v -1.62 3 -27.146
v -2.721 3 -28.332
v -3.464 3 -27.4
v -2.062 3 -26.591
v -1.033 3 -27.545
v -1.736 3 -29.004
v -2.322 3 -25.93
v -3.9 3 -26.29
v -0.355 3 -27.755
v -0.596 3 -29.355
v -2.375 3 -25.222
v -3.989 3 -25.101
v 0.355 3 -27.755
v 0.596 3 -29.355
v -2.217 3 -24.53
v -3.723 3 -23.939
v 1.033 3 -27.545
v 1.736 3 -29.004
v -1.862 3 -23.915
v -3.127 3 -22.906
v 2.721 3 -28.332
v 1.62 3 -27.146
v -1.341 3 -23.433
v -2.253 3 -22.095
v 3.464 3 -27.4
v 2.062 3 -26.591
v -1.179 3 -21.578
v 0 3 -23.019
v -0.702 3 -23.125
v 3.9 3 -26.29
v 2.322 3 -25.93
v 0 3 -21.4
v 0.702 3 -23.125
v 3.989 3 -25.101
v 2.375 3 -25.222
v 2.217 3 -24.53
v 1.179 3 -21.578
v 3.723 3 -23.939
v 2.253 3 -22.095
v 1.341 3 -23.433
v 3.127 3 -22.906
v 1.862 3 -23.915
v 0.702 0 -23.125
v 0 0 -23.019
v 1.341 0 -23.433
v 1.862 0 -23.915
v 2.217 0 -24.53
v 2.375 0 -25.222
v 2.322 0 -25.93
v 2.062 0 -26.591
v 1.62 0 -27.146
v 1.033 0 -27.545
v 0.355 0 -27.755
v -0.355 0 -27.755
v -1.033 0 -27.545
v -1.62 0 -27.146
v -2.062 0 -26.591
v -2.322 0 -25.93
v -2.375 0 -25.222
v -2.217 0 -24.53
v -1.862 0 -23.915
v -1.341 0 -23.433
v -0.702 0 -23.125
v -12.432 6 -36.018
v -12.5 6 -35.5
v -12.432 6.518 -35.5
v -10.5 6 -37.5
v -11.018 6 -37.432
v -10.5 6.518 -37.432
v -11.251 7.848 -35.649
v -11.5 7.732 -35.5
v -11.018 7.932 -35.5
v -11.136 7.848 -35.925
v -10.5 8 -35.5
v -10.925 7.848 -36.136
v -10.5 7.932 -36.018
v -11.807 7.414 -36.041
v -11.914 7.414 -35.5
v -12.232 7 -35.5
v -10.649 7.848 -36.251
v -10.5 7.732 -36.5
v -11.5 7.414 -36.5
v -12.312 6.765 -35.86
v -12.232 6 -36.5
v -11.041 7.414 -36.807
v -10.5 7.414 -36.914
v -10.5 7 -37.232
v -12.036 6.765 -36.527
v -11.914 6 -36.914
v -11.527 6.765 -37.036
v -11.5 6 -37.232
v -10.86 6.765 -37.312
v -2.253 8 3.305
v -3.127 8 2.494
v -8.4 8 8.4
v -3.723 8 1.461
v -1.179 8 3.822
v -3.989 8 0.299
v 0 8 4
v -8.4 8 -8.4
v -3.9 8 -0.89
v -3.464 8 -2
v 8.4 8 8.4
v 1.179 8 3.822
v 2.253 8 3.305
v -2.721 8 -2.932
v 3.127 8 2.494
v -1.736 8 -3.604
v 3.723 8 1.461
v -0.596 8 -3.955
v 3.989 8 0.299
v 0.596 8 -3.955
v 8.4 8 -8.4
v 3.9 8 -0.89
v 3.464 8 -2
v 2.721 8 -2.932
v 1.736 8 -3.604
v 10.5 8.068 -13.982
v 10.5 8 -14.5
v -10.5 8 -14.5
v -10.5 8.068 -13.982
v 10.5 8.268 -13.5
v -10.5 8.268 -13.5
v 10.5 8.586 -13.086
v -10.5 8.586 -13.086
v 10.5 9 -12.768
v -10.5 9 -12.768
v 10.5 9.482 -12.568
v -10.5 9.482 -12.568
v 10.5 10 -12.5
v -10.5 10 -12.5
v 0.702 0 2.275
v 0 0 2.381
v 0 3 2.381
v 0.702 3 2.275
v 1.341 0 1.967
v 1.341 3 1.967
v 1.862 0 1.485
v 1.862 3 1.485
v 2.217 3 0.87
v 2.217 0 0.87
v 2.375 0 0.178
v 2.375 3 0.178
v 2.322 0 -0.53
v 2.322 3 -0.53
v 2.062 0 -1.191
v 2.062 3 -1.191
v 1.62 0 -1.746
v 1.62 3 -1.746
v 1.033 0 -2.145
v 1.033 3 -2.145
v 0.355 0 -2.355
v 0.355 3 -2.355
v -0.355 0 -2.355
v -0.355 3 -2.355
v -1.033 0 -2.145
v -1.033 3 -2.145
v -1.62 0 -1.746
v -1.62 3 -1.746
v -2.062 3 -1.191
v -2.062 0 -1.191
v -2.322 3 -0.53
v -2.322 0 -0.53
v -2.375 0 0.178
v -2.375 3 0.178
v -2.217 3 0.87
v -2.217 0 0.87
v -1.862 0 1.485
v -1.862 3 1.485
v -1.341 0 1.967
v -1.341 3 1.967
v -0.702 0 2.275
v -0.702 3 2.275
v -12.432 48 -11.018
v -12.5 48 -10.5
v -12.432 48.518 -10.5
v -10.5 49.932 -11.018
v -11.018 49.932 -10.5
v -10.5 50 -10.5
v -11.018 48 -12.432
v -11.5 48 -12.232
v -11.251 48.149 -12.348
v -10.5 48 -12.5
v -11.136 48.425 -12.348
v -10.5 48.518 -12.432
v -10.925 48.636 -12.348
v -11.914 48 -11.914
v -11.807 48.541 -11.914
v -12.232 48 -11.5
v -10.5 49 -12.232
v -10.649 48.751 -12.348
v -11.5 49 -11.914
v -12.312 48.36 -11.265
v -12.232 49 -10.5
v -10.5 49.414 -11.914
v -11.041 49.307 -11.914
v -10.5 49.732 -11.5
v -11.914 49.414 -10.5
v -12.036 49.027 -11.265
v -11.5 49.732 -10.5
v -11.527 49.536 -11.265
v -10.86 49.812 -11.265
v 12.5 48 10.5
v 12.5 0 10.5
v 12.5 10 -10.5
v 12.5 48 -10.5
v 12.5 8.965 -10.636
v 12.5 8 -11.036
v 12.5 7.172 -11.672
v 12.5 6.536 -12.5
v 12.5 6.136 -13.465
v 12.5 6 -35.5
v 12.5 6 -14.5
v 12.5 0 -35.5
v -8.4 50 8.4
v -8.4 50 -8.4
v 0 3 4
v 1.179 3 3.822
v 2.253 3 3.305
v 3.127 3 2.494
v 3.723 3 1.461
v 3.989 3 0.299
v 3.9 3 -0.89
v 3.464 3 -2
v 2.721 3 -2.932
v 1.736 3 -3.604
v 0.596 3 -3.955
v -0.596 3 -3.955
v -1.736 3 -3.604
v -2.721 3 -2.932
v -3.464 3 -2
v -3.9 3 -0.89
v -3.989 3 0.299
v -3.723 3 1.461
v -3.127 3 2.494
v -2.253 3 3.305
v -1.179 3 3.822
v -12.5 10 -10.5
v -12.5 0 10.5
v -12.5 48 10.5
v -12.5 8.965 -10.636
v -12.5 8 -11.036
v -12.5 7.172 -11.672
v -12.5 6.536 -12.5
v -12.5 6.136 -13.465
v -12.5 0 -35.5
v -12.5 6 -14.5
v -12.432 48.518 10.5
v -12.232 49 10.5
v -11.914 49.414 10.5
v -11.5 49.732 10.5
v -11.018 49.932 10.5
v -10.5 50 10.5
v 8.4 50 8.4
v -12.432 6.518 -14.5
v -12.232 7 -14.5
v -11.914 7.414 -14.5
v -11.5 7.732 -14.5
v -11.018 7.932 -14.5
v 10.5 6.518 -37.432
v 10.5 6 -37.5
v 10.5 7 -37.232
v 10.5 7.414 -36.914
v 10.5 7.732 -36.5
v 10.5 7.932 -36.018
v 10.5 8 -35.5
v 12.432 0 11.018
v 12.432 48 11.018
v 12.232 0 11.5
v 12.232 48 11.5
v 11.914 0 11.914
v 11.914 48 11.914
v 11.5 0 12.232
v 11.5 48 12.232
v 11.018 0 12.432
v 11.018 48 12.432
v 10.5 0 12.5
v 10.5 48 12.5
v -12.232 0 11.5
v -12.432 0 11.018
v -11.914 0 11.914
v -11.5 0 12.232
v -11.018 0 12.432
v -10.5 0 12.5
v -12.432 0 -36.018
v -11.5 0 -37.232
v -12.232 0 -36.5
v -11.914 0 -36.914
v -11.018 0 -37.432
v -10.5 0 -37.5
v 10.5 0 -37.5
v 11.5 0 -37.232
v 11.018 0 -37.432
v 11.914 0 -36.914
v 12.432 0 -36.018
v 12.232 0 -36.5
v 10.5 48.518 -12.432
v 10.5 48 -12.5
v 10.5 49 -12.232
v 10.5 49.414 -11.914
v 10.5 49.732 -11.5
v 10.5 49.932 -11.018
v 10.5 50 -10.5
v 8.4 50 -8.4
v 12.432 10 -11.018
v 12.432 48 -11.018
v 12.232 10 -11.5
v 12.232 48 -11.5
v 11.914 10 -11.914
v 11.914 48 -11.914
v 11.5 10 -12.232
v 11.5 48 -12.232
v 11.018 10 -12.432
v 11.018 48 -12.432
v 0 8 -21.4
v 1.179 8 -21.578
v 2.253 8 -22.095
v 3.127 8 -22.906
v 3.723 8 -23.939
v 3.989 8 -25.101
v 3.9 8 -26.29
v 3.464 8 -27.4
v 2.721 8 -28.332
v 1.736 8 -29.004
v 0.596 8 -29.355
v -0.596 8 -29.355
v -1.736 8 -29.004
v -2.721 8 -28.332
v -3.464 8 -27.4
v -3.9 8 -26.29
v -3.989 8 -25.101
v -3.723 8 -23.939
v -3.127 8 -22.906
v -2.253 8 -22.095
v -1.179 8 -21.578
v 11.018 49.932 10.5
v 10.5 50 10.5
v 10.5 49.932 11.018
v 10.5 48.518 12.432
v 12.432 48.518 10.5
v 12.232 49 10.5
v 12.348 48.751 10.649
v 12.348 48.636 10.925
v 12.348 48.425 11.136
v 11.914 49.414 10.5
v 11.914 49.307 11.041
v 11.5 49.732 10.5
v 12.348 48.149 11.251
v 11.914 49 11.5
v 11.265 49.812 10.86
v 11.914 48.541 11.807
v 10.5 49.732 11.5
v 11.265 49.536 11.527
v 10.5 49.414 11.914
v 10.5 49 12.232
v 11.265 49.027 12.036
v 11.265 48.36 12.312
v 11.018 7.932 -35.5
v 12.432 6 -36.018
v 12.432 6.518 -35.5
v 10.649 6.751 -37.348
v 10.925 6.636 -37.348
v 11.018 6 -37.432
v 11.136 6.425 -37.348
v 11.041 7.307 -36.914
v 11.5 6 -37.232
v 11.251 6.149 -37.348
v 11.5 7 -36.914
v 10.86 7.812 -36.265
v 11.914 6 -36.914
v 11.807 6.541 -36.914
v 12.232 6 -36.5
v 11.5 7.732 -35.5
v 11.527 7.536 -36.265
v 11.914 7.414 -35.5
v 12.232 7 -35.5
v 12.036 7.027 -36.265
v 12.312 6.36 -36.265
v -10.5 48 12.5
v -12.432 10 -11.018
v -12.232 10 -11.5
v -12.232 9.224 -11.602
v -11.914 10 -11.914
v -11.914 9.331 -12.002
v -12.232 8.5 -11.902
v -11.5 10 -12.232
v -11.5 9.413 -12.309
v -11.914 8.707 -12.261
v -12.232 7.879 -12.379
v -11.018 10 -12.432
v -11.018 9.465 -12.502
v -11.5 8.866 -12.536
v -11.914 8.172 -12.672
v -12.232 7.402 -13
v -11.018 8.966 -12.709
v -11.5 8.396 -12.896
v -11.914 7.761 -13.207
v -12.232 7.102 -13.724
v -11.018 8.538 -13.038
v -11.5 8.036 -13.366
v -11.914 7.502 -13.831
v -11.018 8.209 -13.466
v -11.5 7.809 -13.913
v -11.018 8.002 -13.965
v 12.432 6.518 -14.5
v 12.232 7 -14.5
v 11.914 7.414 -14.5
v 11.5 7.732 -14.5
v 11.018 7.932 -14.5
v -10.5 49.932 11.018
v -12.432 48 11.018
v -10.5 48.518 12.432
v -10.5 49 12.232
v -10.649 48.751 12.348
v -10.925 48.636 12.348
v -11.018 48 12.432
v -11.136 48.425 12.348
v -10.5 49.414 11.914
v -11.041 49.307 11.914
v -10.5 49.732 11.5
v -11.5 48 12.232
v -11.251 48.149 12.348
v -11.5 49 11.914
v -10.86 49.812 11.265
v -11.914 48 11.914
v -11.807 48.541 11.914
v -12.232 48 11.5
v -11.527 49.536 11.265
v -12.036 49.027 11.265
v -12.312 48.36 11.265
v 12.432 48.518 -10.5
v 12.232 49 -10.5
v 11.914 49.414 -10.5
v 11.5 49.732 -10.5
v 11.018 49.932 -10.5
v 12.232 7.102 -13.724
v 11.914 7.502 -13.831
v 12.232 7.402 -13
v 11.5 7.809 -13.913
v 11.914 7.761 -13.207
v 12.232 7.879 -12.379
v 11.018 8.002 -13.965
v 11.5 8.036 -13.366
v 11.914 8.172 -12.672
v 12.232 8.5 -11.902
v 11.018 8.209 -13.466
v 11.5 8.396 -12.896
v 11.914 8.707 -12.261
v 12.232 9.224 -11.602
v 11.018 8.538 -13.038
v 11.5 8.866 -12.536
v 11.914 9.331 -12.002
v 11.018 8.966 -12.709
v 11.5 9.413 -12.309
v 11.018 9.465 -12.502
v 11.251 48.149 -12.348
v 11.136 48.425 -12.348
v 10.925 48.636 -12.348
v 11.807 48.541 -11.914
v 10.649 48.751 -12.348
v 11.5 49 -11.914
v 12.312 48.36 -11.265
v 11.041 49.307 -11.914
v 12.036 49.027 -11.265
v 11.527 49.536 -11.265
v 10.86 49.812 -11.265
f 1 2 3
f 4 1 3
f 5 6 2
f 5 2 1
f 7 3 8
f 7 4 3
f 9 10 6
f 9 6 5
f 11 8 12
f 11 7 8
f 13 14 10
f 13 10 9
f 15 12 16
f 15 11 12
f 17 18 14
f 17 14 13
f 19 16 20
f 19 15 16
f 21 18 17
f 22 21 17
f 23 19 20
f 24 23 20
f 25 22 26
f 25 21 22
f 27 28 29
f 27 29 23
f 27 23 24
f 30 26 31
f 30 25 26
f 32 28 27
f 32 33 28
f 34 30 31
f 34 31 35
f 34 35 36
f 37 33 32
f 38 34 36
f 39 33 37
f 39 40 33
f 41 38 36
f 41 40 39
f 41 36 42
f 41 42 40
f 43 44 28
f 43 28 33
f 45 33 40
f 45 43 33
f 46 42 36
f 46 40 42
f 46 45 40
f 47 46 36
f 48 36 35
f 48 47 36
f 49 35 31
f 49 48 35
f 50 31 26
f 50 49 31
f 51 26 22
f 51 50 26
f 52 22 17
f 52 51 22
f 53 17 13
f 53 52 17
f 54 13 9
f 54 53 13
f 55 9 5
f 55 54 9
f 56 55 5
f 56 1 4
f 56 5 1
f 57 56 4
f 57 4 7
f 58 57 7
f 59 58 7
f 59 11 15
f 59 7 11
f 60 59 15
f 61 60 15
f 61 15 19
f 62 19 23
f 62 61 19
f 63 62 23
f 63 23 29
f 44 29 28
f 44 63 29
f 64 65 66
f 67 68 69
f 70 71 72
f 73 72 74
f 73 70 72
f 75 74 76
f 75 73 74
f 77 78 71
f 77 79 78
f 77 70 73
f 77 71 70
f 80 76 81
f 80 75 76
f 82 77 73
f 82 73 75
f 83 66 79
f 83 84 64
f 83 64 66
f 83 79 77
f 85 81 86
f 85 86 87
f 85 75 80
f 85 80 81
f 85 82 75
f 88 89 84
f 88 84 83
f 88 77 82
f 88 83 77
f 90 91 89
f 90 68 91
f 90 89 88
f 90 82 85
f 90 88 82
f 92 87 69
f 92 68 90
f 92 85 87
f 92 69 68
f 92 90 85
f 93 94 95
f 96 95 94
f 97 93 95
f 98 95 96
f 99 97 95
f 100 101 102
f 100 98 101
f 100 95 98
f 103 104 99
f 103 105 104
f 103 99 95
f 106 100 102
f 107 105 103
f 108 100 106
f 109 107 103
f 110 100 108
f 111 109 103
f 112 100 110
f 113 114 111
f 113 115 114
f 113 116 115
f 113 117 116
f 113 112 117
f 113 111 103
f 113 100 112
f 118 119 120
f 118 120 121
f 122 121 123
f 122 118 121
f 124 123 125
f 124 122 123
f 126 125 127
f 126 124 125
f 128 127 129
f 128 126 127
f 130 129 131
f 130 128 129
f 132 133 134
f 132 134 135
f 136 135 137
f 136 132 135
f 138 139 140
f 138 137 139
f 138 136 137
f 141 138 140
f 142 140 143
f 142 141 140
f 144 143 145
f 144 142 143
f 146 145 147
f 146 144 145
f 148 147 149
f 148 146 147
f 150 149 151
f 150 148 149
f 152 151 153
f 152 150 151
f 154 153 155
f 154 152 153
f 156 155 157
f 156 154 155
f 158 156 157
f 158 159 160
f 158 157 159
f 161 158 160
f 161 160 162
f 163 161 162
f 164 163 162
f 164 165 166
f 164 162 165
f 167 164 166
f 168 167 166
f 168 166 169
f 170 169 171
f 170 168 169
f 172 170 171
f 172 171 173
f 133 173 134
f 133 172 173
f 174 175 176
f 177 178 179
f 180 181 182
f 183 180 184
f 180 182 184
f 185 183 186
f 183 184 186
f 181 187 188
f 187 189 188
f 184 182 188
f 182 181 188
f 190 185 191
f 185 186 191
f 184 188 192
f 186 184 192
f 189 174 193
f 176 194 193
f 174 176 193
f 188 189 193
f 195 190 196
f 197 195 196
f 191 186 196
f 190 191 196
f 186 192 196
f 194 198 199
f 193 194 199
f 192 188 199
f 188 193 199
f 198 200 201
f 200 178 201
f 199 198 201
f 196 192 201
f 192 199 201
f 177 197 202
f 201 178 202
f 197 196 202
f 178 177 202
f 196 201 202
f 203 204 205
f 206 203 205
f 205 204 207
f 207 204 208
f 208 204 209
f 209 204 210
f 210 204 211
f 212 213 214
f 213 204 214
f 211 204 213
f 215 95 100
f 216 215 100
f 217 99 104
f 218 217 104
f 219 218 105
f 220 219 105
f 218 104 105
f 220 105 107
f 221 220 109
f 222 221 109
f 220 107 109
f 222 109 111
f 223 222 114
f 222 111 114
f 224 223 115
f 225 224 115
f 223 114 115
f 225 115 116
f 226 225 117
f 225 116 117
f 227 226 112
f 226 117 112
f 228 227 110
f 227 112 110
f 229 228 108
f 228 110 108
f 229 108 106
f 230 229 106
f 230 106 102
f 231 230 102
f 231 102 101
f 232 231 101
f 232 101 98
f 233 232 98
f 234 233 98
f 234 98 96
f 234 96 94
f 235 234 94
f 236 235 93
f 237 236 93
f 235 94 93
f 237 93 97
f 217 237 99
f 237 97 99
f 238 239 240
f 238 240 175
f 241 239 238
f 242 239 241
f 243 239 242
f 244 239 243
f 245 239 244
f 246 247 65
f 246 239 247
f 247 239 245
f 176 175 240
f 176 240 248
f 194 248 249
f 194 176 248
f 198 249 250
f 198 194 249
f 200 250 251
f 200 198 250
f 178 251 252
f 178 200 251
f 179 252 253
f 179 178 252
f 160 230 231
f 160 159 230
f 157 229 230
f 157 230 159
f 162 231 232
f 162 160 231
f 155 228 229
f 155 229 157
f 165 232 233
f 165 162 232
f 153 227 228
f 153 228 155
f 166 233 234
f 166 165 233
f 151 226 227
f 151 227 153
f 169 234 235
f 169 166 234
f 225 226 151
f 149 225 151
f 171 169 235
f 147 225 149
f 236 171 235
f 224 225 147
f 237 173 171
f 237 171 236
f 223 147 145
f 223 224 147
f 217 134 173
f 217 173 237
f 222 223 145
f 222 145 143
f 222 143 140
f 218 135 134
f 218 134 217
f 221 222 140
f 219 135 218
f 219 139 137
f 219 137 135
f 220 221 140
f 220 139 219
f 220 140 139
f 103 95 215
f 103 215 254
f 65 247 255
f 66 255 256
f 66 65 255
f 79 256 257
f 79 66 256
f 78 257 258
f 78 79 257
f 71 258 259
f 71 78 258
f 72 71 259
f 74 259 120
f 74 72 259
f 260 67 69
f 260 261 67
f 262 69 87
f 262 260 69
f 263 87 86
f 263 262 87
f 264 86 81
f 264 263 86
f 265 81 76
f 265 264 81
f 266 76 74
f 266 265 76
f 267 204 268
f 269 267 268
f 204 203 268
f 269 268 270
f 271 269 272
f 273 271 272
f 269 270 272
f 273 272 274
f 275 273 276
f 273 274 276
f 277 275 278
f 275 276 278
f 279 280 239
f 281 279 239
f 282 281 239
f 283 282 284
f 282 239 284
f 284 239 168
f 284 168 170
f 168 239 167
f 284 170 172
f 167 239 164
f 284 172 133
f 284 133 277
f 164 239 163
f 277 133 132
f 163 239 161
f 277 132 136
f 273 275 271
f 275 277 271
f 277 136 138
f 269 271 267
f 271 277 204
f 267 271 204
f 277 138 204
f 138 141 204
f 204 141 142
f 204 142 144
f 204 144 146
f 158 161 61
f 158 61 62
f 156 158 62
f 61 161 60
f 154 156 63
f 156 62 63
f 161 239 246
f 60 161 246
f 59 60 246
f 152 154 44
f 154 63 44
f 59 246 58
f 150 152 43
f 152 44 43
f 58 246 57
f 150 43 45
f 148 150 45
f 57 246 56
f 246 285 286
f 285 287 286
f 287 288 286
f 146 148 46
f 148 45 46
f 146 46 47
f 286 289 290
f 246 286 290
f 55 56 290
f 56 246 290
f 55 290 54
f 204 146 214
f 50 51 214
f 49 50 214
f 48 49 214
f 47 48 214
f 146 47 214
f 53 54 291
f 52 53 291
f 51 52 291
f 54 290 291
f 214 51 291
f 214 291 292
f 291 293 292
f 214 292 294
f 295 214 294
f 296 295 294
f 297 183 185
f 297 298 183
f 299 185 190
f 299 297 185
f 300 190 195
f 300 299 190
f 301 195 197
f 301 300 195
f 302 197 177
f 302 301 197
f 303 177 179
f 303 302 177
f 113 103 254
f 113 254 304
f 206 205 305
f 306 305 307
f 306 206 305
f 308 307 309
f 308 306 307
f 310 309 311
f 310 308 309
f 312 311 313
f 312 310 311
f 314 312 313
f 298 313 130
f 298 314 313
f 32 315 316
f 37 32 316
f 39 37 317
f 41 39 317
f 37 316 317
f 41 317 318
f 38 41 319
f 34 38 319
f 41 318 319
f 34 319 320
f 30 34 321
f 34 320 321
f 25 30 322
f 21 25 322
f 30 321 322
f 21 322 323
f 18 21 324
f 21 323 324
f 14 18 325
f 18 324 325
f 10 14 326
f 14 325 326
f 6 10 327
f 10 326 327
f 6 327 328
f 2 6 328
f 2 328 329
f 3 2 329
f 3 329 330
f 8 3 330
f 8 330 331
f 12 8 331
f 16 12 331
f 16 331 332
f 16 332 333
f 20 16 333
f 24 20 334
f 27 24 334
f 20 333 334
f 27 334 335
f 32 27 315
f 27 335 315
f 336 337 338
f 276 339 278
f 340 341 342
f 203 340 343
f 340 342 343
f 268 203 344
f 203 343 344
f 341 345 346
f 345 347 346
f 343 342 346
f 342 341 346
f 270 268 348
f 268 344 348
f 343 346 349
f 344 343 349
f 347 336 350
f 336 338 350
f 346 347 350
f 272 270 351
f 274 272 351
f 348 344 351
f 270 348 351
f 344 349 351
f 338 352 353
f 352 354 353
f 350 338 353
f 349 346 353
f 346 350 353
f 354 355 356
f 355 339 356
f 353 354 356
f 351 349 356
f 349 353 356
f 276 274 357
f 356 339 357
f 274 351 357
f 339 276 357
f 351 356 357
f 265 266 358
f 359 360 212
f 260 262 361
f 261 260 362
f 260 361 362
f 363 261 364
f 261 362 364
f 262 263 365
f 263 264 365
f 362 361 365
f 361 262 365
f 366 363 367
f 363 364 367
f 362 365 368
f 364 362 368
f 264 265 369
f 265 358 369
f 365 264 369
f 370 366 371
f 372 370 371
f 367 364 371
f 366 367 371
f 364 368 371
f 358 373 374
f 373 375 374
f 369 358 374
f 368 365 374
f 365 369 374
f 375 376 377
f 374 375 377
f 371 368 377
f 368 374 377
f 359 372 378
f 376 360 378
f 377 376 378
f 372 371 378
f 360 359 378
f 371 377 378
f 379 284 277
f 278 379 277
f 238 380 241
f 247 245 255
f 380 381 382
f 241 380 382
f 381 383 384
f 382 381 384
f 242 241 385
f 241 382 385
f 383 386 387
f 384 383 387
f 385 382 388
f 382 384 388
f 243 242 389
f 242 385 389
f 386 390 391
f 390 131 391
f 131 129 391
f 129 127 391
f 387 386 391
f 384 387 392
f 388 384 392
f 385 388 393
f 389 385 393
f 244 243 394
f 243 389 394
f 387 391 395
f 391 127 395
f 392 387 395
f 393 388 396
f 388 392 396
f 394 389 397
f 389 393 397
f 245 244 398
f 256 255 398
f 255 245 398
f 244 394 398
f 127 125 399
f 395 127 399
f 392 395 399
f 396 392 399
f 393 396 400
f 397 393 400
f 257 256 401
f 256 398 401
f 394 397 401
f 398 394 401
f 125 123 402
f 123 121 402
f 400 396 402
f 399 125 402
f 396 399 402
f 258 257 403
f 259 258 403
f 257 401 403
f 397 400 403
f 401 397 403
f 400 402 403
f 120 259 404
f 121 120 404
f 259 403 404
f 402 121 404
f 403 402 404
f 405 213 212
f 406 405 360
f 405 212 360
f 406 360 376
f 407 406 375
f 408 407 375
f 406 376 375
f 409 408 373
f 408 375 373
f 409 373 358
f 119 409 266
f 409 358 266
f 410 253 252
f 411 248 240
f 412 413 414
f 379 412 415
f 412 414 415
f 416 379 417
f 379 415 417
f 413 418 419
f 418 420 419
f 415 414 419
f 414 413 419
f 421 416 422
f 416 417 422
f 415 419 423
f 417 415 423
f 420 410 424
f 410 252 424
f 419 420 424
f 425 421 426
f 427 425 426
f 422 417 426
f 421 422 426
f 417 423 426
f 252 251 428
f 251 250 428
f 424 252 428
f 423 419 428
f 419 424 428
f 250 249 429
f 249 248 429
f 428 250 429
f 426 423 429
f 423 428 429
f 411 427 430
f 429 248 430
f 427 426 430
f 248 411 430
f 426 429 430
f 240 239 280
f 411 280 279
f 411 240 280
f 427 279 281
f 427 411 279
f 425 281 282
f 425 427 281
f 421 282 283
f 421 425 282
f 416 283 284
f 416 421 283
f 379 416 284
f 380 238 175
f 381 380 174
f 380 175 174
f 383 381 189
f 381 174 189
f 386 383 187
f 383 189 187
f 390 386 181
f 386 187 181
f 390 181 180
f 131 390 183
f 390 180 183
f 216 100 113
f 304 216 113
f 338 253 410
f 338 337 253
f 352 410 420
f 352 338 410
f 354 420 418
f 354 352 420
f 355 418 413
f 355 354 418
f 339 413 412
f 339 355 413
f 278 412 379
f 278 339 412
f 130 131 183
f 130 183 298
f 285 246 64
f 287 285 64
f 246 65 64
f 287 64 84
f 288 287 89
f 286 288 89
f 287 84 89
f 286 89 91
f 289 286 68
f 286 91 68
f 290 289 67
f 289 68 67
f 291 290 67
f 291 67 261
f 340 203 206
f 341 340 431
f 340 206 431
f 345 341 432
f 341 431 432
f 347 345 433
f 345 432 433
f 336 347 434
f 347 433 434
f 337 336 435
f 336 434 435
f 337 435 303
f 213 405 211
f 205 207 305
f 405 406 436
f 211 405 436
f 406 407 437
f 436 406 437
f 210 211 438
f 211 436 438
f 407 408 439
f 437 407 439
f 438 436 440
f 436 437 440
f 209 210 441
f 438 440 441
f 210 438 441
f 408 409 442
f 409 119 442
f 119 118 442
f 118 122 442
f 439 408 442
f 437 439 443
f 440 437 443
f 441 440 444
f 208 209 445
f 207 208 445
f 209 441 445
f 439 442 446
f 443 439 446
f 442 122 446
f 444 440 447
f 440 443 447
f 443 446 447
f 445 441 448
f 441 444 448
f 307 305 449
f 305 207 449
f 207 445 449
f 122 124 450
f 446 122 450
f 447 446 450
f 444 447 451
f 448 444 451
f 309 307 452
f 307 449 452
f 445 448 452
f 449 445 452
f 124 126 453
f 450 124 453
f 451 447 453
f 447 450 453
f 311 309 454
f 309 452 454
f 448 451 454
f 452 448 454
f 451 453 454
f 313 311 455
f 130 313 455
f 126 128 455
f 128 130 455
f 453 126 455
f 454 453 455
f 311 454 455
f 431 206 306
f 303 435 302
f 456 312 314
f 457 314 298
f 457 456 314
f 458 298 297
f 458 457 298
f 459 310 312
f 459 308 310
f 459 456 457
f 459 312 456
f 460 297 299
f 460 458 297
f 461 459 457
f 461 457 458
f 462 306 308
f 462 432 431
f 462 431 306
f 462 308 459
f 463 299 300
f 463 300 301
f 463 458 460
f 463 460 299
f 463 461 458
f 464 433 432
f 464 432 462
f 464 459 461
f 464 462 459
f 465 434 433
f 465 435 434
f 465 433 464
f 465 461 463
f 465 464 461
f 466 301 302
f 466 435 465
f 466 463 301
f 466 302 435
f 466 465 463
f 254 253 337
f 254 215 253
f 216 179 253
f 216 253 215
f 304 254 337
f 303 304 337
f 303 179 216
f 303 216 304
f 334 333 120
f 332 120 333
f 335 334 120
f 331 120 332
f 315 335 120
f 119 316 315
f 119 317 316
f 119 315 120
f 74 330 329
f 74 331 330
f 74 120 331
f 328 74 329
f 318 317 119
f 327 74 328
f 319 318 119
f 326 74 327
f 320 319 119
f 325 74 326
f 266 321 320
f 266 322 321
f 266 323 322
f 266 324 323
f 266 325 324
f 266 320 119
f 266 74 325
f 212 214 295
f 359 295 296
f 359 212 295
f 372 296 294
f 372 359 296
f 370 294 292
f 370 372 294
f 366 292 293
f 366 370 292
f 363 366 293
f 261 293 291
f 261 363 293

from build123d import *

# Parameters (mm, degrees)
SKETCH1_W               = 25
SKETCH1_H               = 25
SKETCH1_W_2             = 16.8
SKETCH1_H_2             = 16.8
BOSS_EXTRUDE1_DEPTH     = 50
SKETCH6_W               = 25
SKETCH6_H               = 50
BOSS_EXTRUDE3_DEPTH     = 8
FILLET2_R               = 2
SKETCH7_R               = 4
CUT_EXTRUDE1_DEPTH      = 5
CUT_EXTRUDE4_DEPTH      = 64.73774392
CUT_EXTRUDE4_DEPTH_BACK = 64.73774392
SKETCH8_R               = 2.38125


with BuildPart() as part:
    # Sketch1 → Boss-Extrude1 (new body)
    with BuildSketch(Plane(origin=(0, 0, 0), x_dir=(1, 0, 0), z_dir=(0, 1, 0))):
        Rectangle(SKETCH1_W, SKETCH1_H)
        Rectangle(SKETCH1_W_2, SKETCH1_H_2, mode=Mode.SUBTRACT)
    extrude(amount=BOSS_EXTRUDE1_DEPTH)

    # Sketch6 → Boss-Extrude3 (add)
    with BuildSketch(Plane(origin=(0, 0, 0), x_dir=(1, 0, 0), z_dir=(0, 1, 0))):
        with Locations((0, 12.5)):
            Rectangle(SKETCH6_W, SKETCH6_H)
    extrude(amount=BOSS_EXTRUDE3_DEPTH)

    # Fillet2
    fillet2_edges = [part.edges().sort_by_distance(p)[0] for p in [
        (-12.5, 50, 0),
        (0, 50, 12.5),
        (-12.5, 4, -37.5),
        (-12.5, 8, -25),
        (0, 8, -12.5),
        (12.5, 8, -25),
        (0, 8, -37.5),
        (12.5, 4, -37.5),
        (12.5, 50, 0),
        (12.5, 25, 12.5),
        (-12.5, 25, 12.5),
        (-12.5, 29, -12.5),
        (12.5, 29, -12.5),
        (0, 50, -12.5),
    ]]
    fillet(fillet2_edges, radius=FILLET2_R)

    # Sketch7 → Cut-Extrude1 (cut)
    with BuildSketch(Plane(origin=(0, 8, 0), x_dir=(1, 0, 0), z_dir=(0, 1, 0))):
        with Locations(Location((0, 0, 0), (0, 0, 270))):
            Circle(SKETCH7_R)
        with Locations(Location((0, 25.4, 0), (0, 0, 270))):
            Circle(SKETCH7_R)
    extrude(amount=-CUT_EXTRUDE1_DEPTH, mode=Mode.SUBTRACT)

    # Sketch8 → Cut-Extrude4 (cut, two sides: drawn at the far end of the back side and taken through both)
    with BuildSketch(Plane(origin=(0, 0, 0), x_dir=(1, 0, 0), z_dir=(0, 1, 0)).offset(-CUT_EXTRUDE4_DEPTH_BACK)):
        with Locations(Location((0, 0, 0), (0, 0, 270))):
            Circle(SKETCH8_R)
        with Locations(Location((0, 25.4, 0), (0, 0, 270))):
            Circle(SKETCH8_R)
    extrude(amount=CUT_EXTRUDE4_DEPTH + CUT_EXTRUDE4_DEPTH_BACK, mode=Mode.SUBTRACT)


solid = part.part
